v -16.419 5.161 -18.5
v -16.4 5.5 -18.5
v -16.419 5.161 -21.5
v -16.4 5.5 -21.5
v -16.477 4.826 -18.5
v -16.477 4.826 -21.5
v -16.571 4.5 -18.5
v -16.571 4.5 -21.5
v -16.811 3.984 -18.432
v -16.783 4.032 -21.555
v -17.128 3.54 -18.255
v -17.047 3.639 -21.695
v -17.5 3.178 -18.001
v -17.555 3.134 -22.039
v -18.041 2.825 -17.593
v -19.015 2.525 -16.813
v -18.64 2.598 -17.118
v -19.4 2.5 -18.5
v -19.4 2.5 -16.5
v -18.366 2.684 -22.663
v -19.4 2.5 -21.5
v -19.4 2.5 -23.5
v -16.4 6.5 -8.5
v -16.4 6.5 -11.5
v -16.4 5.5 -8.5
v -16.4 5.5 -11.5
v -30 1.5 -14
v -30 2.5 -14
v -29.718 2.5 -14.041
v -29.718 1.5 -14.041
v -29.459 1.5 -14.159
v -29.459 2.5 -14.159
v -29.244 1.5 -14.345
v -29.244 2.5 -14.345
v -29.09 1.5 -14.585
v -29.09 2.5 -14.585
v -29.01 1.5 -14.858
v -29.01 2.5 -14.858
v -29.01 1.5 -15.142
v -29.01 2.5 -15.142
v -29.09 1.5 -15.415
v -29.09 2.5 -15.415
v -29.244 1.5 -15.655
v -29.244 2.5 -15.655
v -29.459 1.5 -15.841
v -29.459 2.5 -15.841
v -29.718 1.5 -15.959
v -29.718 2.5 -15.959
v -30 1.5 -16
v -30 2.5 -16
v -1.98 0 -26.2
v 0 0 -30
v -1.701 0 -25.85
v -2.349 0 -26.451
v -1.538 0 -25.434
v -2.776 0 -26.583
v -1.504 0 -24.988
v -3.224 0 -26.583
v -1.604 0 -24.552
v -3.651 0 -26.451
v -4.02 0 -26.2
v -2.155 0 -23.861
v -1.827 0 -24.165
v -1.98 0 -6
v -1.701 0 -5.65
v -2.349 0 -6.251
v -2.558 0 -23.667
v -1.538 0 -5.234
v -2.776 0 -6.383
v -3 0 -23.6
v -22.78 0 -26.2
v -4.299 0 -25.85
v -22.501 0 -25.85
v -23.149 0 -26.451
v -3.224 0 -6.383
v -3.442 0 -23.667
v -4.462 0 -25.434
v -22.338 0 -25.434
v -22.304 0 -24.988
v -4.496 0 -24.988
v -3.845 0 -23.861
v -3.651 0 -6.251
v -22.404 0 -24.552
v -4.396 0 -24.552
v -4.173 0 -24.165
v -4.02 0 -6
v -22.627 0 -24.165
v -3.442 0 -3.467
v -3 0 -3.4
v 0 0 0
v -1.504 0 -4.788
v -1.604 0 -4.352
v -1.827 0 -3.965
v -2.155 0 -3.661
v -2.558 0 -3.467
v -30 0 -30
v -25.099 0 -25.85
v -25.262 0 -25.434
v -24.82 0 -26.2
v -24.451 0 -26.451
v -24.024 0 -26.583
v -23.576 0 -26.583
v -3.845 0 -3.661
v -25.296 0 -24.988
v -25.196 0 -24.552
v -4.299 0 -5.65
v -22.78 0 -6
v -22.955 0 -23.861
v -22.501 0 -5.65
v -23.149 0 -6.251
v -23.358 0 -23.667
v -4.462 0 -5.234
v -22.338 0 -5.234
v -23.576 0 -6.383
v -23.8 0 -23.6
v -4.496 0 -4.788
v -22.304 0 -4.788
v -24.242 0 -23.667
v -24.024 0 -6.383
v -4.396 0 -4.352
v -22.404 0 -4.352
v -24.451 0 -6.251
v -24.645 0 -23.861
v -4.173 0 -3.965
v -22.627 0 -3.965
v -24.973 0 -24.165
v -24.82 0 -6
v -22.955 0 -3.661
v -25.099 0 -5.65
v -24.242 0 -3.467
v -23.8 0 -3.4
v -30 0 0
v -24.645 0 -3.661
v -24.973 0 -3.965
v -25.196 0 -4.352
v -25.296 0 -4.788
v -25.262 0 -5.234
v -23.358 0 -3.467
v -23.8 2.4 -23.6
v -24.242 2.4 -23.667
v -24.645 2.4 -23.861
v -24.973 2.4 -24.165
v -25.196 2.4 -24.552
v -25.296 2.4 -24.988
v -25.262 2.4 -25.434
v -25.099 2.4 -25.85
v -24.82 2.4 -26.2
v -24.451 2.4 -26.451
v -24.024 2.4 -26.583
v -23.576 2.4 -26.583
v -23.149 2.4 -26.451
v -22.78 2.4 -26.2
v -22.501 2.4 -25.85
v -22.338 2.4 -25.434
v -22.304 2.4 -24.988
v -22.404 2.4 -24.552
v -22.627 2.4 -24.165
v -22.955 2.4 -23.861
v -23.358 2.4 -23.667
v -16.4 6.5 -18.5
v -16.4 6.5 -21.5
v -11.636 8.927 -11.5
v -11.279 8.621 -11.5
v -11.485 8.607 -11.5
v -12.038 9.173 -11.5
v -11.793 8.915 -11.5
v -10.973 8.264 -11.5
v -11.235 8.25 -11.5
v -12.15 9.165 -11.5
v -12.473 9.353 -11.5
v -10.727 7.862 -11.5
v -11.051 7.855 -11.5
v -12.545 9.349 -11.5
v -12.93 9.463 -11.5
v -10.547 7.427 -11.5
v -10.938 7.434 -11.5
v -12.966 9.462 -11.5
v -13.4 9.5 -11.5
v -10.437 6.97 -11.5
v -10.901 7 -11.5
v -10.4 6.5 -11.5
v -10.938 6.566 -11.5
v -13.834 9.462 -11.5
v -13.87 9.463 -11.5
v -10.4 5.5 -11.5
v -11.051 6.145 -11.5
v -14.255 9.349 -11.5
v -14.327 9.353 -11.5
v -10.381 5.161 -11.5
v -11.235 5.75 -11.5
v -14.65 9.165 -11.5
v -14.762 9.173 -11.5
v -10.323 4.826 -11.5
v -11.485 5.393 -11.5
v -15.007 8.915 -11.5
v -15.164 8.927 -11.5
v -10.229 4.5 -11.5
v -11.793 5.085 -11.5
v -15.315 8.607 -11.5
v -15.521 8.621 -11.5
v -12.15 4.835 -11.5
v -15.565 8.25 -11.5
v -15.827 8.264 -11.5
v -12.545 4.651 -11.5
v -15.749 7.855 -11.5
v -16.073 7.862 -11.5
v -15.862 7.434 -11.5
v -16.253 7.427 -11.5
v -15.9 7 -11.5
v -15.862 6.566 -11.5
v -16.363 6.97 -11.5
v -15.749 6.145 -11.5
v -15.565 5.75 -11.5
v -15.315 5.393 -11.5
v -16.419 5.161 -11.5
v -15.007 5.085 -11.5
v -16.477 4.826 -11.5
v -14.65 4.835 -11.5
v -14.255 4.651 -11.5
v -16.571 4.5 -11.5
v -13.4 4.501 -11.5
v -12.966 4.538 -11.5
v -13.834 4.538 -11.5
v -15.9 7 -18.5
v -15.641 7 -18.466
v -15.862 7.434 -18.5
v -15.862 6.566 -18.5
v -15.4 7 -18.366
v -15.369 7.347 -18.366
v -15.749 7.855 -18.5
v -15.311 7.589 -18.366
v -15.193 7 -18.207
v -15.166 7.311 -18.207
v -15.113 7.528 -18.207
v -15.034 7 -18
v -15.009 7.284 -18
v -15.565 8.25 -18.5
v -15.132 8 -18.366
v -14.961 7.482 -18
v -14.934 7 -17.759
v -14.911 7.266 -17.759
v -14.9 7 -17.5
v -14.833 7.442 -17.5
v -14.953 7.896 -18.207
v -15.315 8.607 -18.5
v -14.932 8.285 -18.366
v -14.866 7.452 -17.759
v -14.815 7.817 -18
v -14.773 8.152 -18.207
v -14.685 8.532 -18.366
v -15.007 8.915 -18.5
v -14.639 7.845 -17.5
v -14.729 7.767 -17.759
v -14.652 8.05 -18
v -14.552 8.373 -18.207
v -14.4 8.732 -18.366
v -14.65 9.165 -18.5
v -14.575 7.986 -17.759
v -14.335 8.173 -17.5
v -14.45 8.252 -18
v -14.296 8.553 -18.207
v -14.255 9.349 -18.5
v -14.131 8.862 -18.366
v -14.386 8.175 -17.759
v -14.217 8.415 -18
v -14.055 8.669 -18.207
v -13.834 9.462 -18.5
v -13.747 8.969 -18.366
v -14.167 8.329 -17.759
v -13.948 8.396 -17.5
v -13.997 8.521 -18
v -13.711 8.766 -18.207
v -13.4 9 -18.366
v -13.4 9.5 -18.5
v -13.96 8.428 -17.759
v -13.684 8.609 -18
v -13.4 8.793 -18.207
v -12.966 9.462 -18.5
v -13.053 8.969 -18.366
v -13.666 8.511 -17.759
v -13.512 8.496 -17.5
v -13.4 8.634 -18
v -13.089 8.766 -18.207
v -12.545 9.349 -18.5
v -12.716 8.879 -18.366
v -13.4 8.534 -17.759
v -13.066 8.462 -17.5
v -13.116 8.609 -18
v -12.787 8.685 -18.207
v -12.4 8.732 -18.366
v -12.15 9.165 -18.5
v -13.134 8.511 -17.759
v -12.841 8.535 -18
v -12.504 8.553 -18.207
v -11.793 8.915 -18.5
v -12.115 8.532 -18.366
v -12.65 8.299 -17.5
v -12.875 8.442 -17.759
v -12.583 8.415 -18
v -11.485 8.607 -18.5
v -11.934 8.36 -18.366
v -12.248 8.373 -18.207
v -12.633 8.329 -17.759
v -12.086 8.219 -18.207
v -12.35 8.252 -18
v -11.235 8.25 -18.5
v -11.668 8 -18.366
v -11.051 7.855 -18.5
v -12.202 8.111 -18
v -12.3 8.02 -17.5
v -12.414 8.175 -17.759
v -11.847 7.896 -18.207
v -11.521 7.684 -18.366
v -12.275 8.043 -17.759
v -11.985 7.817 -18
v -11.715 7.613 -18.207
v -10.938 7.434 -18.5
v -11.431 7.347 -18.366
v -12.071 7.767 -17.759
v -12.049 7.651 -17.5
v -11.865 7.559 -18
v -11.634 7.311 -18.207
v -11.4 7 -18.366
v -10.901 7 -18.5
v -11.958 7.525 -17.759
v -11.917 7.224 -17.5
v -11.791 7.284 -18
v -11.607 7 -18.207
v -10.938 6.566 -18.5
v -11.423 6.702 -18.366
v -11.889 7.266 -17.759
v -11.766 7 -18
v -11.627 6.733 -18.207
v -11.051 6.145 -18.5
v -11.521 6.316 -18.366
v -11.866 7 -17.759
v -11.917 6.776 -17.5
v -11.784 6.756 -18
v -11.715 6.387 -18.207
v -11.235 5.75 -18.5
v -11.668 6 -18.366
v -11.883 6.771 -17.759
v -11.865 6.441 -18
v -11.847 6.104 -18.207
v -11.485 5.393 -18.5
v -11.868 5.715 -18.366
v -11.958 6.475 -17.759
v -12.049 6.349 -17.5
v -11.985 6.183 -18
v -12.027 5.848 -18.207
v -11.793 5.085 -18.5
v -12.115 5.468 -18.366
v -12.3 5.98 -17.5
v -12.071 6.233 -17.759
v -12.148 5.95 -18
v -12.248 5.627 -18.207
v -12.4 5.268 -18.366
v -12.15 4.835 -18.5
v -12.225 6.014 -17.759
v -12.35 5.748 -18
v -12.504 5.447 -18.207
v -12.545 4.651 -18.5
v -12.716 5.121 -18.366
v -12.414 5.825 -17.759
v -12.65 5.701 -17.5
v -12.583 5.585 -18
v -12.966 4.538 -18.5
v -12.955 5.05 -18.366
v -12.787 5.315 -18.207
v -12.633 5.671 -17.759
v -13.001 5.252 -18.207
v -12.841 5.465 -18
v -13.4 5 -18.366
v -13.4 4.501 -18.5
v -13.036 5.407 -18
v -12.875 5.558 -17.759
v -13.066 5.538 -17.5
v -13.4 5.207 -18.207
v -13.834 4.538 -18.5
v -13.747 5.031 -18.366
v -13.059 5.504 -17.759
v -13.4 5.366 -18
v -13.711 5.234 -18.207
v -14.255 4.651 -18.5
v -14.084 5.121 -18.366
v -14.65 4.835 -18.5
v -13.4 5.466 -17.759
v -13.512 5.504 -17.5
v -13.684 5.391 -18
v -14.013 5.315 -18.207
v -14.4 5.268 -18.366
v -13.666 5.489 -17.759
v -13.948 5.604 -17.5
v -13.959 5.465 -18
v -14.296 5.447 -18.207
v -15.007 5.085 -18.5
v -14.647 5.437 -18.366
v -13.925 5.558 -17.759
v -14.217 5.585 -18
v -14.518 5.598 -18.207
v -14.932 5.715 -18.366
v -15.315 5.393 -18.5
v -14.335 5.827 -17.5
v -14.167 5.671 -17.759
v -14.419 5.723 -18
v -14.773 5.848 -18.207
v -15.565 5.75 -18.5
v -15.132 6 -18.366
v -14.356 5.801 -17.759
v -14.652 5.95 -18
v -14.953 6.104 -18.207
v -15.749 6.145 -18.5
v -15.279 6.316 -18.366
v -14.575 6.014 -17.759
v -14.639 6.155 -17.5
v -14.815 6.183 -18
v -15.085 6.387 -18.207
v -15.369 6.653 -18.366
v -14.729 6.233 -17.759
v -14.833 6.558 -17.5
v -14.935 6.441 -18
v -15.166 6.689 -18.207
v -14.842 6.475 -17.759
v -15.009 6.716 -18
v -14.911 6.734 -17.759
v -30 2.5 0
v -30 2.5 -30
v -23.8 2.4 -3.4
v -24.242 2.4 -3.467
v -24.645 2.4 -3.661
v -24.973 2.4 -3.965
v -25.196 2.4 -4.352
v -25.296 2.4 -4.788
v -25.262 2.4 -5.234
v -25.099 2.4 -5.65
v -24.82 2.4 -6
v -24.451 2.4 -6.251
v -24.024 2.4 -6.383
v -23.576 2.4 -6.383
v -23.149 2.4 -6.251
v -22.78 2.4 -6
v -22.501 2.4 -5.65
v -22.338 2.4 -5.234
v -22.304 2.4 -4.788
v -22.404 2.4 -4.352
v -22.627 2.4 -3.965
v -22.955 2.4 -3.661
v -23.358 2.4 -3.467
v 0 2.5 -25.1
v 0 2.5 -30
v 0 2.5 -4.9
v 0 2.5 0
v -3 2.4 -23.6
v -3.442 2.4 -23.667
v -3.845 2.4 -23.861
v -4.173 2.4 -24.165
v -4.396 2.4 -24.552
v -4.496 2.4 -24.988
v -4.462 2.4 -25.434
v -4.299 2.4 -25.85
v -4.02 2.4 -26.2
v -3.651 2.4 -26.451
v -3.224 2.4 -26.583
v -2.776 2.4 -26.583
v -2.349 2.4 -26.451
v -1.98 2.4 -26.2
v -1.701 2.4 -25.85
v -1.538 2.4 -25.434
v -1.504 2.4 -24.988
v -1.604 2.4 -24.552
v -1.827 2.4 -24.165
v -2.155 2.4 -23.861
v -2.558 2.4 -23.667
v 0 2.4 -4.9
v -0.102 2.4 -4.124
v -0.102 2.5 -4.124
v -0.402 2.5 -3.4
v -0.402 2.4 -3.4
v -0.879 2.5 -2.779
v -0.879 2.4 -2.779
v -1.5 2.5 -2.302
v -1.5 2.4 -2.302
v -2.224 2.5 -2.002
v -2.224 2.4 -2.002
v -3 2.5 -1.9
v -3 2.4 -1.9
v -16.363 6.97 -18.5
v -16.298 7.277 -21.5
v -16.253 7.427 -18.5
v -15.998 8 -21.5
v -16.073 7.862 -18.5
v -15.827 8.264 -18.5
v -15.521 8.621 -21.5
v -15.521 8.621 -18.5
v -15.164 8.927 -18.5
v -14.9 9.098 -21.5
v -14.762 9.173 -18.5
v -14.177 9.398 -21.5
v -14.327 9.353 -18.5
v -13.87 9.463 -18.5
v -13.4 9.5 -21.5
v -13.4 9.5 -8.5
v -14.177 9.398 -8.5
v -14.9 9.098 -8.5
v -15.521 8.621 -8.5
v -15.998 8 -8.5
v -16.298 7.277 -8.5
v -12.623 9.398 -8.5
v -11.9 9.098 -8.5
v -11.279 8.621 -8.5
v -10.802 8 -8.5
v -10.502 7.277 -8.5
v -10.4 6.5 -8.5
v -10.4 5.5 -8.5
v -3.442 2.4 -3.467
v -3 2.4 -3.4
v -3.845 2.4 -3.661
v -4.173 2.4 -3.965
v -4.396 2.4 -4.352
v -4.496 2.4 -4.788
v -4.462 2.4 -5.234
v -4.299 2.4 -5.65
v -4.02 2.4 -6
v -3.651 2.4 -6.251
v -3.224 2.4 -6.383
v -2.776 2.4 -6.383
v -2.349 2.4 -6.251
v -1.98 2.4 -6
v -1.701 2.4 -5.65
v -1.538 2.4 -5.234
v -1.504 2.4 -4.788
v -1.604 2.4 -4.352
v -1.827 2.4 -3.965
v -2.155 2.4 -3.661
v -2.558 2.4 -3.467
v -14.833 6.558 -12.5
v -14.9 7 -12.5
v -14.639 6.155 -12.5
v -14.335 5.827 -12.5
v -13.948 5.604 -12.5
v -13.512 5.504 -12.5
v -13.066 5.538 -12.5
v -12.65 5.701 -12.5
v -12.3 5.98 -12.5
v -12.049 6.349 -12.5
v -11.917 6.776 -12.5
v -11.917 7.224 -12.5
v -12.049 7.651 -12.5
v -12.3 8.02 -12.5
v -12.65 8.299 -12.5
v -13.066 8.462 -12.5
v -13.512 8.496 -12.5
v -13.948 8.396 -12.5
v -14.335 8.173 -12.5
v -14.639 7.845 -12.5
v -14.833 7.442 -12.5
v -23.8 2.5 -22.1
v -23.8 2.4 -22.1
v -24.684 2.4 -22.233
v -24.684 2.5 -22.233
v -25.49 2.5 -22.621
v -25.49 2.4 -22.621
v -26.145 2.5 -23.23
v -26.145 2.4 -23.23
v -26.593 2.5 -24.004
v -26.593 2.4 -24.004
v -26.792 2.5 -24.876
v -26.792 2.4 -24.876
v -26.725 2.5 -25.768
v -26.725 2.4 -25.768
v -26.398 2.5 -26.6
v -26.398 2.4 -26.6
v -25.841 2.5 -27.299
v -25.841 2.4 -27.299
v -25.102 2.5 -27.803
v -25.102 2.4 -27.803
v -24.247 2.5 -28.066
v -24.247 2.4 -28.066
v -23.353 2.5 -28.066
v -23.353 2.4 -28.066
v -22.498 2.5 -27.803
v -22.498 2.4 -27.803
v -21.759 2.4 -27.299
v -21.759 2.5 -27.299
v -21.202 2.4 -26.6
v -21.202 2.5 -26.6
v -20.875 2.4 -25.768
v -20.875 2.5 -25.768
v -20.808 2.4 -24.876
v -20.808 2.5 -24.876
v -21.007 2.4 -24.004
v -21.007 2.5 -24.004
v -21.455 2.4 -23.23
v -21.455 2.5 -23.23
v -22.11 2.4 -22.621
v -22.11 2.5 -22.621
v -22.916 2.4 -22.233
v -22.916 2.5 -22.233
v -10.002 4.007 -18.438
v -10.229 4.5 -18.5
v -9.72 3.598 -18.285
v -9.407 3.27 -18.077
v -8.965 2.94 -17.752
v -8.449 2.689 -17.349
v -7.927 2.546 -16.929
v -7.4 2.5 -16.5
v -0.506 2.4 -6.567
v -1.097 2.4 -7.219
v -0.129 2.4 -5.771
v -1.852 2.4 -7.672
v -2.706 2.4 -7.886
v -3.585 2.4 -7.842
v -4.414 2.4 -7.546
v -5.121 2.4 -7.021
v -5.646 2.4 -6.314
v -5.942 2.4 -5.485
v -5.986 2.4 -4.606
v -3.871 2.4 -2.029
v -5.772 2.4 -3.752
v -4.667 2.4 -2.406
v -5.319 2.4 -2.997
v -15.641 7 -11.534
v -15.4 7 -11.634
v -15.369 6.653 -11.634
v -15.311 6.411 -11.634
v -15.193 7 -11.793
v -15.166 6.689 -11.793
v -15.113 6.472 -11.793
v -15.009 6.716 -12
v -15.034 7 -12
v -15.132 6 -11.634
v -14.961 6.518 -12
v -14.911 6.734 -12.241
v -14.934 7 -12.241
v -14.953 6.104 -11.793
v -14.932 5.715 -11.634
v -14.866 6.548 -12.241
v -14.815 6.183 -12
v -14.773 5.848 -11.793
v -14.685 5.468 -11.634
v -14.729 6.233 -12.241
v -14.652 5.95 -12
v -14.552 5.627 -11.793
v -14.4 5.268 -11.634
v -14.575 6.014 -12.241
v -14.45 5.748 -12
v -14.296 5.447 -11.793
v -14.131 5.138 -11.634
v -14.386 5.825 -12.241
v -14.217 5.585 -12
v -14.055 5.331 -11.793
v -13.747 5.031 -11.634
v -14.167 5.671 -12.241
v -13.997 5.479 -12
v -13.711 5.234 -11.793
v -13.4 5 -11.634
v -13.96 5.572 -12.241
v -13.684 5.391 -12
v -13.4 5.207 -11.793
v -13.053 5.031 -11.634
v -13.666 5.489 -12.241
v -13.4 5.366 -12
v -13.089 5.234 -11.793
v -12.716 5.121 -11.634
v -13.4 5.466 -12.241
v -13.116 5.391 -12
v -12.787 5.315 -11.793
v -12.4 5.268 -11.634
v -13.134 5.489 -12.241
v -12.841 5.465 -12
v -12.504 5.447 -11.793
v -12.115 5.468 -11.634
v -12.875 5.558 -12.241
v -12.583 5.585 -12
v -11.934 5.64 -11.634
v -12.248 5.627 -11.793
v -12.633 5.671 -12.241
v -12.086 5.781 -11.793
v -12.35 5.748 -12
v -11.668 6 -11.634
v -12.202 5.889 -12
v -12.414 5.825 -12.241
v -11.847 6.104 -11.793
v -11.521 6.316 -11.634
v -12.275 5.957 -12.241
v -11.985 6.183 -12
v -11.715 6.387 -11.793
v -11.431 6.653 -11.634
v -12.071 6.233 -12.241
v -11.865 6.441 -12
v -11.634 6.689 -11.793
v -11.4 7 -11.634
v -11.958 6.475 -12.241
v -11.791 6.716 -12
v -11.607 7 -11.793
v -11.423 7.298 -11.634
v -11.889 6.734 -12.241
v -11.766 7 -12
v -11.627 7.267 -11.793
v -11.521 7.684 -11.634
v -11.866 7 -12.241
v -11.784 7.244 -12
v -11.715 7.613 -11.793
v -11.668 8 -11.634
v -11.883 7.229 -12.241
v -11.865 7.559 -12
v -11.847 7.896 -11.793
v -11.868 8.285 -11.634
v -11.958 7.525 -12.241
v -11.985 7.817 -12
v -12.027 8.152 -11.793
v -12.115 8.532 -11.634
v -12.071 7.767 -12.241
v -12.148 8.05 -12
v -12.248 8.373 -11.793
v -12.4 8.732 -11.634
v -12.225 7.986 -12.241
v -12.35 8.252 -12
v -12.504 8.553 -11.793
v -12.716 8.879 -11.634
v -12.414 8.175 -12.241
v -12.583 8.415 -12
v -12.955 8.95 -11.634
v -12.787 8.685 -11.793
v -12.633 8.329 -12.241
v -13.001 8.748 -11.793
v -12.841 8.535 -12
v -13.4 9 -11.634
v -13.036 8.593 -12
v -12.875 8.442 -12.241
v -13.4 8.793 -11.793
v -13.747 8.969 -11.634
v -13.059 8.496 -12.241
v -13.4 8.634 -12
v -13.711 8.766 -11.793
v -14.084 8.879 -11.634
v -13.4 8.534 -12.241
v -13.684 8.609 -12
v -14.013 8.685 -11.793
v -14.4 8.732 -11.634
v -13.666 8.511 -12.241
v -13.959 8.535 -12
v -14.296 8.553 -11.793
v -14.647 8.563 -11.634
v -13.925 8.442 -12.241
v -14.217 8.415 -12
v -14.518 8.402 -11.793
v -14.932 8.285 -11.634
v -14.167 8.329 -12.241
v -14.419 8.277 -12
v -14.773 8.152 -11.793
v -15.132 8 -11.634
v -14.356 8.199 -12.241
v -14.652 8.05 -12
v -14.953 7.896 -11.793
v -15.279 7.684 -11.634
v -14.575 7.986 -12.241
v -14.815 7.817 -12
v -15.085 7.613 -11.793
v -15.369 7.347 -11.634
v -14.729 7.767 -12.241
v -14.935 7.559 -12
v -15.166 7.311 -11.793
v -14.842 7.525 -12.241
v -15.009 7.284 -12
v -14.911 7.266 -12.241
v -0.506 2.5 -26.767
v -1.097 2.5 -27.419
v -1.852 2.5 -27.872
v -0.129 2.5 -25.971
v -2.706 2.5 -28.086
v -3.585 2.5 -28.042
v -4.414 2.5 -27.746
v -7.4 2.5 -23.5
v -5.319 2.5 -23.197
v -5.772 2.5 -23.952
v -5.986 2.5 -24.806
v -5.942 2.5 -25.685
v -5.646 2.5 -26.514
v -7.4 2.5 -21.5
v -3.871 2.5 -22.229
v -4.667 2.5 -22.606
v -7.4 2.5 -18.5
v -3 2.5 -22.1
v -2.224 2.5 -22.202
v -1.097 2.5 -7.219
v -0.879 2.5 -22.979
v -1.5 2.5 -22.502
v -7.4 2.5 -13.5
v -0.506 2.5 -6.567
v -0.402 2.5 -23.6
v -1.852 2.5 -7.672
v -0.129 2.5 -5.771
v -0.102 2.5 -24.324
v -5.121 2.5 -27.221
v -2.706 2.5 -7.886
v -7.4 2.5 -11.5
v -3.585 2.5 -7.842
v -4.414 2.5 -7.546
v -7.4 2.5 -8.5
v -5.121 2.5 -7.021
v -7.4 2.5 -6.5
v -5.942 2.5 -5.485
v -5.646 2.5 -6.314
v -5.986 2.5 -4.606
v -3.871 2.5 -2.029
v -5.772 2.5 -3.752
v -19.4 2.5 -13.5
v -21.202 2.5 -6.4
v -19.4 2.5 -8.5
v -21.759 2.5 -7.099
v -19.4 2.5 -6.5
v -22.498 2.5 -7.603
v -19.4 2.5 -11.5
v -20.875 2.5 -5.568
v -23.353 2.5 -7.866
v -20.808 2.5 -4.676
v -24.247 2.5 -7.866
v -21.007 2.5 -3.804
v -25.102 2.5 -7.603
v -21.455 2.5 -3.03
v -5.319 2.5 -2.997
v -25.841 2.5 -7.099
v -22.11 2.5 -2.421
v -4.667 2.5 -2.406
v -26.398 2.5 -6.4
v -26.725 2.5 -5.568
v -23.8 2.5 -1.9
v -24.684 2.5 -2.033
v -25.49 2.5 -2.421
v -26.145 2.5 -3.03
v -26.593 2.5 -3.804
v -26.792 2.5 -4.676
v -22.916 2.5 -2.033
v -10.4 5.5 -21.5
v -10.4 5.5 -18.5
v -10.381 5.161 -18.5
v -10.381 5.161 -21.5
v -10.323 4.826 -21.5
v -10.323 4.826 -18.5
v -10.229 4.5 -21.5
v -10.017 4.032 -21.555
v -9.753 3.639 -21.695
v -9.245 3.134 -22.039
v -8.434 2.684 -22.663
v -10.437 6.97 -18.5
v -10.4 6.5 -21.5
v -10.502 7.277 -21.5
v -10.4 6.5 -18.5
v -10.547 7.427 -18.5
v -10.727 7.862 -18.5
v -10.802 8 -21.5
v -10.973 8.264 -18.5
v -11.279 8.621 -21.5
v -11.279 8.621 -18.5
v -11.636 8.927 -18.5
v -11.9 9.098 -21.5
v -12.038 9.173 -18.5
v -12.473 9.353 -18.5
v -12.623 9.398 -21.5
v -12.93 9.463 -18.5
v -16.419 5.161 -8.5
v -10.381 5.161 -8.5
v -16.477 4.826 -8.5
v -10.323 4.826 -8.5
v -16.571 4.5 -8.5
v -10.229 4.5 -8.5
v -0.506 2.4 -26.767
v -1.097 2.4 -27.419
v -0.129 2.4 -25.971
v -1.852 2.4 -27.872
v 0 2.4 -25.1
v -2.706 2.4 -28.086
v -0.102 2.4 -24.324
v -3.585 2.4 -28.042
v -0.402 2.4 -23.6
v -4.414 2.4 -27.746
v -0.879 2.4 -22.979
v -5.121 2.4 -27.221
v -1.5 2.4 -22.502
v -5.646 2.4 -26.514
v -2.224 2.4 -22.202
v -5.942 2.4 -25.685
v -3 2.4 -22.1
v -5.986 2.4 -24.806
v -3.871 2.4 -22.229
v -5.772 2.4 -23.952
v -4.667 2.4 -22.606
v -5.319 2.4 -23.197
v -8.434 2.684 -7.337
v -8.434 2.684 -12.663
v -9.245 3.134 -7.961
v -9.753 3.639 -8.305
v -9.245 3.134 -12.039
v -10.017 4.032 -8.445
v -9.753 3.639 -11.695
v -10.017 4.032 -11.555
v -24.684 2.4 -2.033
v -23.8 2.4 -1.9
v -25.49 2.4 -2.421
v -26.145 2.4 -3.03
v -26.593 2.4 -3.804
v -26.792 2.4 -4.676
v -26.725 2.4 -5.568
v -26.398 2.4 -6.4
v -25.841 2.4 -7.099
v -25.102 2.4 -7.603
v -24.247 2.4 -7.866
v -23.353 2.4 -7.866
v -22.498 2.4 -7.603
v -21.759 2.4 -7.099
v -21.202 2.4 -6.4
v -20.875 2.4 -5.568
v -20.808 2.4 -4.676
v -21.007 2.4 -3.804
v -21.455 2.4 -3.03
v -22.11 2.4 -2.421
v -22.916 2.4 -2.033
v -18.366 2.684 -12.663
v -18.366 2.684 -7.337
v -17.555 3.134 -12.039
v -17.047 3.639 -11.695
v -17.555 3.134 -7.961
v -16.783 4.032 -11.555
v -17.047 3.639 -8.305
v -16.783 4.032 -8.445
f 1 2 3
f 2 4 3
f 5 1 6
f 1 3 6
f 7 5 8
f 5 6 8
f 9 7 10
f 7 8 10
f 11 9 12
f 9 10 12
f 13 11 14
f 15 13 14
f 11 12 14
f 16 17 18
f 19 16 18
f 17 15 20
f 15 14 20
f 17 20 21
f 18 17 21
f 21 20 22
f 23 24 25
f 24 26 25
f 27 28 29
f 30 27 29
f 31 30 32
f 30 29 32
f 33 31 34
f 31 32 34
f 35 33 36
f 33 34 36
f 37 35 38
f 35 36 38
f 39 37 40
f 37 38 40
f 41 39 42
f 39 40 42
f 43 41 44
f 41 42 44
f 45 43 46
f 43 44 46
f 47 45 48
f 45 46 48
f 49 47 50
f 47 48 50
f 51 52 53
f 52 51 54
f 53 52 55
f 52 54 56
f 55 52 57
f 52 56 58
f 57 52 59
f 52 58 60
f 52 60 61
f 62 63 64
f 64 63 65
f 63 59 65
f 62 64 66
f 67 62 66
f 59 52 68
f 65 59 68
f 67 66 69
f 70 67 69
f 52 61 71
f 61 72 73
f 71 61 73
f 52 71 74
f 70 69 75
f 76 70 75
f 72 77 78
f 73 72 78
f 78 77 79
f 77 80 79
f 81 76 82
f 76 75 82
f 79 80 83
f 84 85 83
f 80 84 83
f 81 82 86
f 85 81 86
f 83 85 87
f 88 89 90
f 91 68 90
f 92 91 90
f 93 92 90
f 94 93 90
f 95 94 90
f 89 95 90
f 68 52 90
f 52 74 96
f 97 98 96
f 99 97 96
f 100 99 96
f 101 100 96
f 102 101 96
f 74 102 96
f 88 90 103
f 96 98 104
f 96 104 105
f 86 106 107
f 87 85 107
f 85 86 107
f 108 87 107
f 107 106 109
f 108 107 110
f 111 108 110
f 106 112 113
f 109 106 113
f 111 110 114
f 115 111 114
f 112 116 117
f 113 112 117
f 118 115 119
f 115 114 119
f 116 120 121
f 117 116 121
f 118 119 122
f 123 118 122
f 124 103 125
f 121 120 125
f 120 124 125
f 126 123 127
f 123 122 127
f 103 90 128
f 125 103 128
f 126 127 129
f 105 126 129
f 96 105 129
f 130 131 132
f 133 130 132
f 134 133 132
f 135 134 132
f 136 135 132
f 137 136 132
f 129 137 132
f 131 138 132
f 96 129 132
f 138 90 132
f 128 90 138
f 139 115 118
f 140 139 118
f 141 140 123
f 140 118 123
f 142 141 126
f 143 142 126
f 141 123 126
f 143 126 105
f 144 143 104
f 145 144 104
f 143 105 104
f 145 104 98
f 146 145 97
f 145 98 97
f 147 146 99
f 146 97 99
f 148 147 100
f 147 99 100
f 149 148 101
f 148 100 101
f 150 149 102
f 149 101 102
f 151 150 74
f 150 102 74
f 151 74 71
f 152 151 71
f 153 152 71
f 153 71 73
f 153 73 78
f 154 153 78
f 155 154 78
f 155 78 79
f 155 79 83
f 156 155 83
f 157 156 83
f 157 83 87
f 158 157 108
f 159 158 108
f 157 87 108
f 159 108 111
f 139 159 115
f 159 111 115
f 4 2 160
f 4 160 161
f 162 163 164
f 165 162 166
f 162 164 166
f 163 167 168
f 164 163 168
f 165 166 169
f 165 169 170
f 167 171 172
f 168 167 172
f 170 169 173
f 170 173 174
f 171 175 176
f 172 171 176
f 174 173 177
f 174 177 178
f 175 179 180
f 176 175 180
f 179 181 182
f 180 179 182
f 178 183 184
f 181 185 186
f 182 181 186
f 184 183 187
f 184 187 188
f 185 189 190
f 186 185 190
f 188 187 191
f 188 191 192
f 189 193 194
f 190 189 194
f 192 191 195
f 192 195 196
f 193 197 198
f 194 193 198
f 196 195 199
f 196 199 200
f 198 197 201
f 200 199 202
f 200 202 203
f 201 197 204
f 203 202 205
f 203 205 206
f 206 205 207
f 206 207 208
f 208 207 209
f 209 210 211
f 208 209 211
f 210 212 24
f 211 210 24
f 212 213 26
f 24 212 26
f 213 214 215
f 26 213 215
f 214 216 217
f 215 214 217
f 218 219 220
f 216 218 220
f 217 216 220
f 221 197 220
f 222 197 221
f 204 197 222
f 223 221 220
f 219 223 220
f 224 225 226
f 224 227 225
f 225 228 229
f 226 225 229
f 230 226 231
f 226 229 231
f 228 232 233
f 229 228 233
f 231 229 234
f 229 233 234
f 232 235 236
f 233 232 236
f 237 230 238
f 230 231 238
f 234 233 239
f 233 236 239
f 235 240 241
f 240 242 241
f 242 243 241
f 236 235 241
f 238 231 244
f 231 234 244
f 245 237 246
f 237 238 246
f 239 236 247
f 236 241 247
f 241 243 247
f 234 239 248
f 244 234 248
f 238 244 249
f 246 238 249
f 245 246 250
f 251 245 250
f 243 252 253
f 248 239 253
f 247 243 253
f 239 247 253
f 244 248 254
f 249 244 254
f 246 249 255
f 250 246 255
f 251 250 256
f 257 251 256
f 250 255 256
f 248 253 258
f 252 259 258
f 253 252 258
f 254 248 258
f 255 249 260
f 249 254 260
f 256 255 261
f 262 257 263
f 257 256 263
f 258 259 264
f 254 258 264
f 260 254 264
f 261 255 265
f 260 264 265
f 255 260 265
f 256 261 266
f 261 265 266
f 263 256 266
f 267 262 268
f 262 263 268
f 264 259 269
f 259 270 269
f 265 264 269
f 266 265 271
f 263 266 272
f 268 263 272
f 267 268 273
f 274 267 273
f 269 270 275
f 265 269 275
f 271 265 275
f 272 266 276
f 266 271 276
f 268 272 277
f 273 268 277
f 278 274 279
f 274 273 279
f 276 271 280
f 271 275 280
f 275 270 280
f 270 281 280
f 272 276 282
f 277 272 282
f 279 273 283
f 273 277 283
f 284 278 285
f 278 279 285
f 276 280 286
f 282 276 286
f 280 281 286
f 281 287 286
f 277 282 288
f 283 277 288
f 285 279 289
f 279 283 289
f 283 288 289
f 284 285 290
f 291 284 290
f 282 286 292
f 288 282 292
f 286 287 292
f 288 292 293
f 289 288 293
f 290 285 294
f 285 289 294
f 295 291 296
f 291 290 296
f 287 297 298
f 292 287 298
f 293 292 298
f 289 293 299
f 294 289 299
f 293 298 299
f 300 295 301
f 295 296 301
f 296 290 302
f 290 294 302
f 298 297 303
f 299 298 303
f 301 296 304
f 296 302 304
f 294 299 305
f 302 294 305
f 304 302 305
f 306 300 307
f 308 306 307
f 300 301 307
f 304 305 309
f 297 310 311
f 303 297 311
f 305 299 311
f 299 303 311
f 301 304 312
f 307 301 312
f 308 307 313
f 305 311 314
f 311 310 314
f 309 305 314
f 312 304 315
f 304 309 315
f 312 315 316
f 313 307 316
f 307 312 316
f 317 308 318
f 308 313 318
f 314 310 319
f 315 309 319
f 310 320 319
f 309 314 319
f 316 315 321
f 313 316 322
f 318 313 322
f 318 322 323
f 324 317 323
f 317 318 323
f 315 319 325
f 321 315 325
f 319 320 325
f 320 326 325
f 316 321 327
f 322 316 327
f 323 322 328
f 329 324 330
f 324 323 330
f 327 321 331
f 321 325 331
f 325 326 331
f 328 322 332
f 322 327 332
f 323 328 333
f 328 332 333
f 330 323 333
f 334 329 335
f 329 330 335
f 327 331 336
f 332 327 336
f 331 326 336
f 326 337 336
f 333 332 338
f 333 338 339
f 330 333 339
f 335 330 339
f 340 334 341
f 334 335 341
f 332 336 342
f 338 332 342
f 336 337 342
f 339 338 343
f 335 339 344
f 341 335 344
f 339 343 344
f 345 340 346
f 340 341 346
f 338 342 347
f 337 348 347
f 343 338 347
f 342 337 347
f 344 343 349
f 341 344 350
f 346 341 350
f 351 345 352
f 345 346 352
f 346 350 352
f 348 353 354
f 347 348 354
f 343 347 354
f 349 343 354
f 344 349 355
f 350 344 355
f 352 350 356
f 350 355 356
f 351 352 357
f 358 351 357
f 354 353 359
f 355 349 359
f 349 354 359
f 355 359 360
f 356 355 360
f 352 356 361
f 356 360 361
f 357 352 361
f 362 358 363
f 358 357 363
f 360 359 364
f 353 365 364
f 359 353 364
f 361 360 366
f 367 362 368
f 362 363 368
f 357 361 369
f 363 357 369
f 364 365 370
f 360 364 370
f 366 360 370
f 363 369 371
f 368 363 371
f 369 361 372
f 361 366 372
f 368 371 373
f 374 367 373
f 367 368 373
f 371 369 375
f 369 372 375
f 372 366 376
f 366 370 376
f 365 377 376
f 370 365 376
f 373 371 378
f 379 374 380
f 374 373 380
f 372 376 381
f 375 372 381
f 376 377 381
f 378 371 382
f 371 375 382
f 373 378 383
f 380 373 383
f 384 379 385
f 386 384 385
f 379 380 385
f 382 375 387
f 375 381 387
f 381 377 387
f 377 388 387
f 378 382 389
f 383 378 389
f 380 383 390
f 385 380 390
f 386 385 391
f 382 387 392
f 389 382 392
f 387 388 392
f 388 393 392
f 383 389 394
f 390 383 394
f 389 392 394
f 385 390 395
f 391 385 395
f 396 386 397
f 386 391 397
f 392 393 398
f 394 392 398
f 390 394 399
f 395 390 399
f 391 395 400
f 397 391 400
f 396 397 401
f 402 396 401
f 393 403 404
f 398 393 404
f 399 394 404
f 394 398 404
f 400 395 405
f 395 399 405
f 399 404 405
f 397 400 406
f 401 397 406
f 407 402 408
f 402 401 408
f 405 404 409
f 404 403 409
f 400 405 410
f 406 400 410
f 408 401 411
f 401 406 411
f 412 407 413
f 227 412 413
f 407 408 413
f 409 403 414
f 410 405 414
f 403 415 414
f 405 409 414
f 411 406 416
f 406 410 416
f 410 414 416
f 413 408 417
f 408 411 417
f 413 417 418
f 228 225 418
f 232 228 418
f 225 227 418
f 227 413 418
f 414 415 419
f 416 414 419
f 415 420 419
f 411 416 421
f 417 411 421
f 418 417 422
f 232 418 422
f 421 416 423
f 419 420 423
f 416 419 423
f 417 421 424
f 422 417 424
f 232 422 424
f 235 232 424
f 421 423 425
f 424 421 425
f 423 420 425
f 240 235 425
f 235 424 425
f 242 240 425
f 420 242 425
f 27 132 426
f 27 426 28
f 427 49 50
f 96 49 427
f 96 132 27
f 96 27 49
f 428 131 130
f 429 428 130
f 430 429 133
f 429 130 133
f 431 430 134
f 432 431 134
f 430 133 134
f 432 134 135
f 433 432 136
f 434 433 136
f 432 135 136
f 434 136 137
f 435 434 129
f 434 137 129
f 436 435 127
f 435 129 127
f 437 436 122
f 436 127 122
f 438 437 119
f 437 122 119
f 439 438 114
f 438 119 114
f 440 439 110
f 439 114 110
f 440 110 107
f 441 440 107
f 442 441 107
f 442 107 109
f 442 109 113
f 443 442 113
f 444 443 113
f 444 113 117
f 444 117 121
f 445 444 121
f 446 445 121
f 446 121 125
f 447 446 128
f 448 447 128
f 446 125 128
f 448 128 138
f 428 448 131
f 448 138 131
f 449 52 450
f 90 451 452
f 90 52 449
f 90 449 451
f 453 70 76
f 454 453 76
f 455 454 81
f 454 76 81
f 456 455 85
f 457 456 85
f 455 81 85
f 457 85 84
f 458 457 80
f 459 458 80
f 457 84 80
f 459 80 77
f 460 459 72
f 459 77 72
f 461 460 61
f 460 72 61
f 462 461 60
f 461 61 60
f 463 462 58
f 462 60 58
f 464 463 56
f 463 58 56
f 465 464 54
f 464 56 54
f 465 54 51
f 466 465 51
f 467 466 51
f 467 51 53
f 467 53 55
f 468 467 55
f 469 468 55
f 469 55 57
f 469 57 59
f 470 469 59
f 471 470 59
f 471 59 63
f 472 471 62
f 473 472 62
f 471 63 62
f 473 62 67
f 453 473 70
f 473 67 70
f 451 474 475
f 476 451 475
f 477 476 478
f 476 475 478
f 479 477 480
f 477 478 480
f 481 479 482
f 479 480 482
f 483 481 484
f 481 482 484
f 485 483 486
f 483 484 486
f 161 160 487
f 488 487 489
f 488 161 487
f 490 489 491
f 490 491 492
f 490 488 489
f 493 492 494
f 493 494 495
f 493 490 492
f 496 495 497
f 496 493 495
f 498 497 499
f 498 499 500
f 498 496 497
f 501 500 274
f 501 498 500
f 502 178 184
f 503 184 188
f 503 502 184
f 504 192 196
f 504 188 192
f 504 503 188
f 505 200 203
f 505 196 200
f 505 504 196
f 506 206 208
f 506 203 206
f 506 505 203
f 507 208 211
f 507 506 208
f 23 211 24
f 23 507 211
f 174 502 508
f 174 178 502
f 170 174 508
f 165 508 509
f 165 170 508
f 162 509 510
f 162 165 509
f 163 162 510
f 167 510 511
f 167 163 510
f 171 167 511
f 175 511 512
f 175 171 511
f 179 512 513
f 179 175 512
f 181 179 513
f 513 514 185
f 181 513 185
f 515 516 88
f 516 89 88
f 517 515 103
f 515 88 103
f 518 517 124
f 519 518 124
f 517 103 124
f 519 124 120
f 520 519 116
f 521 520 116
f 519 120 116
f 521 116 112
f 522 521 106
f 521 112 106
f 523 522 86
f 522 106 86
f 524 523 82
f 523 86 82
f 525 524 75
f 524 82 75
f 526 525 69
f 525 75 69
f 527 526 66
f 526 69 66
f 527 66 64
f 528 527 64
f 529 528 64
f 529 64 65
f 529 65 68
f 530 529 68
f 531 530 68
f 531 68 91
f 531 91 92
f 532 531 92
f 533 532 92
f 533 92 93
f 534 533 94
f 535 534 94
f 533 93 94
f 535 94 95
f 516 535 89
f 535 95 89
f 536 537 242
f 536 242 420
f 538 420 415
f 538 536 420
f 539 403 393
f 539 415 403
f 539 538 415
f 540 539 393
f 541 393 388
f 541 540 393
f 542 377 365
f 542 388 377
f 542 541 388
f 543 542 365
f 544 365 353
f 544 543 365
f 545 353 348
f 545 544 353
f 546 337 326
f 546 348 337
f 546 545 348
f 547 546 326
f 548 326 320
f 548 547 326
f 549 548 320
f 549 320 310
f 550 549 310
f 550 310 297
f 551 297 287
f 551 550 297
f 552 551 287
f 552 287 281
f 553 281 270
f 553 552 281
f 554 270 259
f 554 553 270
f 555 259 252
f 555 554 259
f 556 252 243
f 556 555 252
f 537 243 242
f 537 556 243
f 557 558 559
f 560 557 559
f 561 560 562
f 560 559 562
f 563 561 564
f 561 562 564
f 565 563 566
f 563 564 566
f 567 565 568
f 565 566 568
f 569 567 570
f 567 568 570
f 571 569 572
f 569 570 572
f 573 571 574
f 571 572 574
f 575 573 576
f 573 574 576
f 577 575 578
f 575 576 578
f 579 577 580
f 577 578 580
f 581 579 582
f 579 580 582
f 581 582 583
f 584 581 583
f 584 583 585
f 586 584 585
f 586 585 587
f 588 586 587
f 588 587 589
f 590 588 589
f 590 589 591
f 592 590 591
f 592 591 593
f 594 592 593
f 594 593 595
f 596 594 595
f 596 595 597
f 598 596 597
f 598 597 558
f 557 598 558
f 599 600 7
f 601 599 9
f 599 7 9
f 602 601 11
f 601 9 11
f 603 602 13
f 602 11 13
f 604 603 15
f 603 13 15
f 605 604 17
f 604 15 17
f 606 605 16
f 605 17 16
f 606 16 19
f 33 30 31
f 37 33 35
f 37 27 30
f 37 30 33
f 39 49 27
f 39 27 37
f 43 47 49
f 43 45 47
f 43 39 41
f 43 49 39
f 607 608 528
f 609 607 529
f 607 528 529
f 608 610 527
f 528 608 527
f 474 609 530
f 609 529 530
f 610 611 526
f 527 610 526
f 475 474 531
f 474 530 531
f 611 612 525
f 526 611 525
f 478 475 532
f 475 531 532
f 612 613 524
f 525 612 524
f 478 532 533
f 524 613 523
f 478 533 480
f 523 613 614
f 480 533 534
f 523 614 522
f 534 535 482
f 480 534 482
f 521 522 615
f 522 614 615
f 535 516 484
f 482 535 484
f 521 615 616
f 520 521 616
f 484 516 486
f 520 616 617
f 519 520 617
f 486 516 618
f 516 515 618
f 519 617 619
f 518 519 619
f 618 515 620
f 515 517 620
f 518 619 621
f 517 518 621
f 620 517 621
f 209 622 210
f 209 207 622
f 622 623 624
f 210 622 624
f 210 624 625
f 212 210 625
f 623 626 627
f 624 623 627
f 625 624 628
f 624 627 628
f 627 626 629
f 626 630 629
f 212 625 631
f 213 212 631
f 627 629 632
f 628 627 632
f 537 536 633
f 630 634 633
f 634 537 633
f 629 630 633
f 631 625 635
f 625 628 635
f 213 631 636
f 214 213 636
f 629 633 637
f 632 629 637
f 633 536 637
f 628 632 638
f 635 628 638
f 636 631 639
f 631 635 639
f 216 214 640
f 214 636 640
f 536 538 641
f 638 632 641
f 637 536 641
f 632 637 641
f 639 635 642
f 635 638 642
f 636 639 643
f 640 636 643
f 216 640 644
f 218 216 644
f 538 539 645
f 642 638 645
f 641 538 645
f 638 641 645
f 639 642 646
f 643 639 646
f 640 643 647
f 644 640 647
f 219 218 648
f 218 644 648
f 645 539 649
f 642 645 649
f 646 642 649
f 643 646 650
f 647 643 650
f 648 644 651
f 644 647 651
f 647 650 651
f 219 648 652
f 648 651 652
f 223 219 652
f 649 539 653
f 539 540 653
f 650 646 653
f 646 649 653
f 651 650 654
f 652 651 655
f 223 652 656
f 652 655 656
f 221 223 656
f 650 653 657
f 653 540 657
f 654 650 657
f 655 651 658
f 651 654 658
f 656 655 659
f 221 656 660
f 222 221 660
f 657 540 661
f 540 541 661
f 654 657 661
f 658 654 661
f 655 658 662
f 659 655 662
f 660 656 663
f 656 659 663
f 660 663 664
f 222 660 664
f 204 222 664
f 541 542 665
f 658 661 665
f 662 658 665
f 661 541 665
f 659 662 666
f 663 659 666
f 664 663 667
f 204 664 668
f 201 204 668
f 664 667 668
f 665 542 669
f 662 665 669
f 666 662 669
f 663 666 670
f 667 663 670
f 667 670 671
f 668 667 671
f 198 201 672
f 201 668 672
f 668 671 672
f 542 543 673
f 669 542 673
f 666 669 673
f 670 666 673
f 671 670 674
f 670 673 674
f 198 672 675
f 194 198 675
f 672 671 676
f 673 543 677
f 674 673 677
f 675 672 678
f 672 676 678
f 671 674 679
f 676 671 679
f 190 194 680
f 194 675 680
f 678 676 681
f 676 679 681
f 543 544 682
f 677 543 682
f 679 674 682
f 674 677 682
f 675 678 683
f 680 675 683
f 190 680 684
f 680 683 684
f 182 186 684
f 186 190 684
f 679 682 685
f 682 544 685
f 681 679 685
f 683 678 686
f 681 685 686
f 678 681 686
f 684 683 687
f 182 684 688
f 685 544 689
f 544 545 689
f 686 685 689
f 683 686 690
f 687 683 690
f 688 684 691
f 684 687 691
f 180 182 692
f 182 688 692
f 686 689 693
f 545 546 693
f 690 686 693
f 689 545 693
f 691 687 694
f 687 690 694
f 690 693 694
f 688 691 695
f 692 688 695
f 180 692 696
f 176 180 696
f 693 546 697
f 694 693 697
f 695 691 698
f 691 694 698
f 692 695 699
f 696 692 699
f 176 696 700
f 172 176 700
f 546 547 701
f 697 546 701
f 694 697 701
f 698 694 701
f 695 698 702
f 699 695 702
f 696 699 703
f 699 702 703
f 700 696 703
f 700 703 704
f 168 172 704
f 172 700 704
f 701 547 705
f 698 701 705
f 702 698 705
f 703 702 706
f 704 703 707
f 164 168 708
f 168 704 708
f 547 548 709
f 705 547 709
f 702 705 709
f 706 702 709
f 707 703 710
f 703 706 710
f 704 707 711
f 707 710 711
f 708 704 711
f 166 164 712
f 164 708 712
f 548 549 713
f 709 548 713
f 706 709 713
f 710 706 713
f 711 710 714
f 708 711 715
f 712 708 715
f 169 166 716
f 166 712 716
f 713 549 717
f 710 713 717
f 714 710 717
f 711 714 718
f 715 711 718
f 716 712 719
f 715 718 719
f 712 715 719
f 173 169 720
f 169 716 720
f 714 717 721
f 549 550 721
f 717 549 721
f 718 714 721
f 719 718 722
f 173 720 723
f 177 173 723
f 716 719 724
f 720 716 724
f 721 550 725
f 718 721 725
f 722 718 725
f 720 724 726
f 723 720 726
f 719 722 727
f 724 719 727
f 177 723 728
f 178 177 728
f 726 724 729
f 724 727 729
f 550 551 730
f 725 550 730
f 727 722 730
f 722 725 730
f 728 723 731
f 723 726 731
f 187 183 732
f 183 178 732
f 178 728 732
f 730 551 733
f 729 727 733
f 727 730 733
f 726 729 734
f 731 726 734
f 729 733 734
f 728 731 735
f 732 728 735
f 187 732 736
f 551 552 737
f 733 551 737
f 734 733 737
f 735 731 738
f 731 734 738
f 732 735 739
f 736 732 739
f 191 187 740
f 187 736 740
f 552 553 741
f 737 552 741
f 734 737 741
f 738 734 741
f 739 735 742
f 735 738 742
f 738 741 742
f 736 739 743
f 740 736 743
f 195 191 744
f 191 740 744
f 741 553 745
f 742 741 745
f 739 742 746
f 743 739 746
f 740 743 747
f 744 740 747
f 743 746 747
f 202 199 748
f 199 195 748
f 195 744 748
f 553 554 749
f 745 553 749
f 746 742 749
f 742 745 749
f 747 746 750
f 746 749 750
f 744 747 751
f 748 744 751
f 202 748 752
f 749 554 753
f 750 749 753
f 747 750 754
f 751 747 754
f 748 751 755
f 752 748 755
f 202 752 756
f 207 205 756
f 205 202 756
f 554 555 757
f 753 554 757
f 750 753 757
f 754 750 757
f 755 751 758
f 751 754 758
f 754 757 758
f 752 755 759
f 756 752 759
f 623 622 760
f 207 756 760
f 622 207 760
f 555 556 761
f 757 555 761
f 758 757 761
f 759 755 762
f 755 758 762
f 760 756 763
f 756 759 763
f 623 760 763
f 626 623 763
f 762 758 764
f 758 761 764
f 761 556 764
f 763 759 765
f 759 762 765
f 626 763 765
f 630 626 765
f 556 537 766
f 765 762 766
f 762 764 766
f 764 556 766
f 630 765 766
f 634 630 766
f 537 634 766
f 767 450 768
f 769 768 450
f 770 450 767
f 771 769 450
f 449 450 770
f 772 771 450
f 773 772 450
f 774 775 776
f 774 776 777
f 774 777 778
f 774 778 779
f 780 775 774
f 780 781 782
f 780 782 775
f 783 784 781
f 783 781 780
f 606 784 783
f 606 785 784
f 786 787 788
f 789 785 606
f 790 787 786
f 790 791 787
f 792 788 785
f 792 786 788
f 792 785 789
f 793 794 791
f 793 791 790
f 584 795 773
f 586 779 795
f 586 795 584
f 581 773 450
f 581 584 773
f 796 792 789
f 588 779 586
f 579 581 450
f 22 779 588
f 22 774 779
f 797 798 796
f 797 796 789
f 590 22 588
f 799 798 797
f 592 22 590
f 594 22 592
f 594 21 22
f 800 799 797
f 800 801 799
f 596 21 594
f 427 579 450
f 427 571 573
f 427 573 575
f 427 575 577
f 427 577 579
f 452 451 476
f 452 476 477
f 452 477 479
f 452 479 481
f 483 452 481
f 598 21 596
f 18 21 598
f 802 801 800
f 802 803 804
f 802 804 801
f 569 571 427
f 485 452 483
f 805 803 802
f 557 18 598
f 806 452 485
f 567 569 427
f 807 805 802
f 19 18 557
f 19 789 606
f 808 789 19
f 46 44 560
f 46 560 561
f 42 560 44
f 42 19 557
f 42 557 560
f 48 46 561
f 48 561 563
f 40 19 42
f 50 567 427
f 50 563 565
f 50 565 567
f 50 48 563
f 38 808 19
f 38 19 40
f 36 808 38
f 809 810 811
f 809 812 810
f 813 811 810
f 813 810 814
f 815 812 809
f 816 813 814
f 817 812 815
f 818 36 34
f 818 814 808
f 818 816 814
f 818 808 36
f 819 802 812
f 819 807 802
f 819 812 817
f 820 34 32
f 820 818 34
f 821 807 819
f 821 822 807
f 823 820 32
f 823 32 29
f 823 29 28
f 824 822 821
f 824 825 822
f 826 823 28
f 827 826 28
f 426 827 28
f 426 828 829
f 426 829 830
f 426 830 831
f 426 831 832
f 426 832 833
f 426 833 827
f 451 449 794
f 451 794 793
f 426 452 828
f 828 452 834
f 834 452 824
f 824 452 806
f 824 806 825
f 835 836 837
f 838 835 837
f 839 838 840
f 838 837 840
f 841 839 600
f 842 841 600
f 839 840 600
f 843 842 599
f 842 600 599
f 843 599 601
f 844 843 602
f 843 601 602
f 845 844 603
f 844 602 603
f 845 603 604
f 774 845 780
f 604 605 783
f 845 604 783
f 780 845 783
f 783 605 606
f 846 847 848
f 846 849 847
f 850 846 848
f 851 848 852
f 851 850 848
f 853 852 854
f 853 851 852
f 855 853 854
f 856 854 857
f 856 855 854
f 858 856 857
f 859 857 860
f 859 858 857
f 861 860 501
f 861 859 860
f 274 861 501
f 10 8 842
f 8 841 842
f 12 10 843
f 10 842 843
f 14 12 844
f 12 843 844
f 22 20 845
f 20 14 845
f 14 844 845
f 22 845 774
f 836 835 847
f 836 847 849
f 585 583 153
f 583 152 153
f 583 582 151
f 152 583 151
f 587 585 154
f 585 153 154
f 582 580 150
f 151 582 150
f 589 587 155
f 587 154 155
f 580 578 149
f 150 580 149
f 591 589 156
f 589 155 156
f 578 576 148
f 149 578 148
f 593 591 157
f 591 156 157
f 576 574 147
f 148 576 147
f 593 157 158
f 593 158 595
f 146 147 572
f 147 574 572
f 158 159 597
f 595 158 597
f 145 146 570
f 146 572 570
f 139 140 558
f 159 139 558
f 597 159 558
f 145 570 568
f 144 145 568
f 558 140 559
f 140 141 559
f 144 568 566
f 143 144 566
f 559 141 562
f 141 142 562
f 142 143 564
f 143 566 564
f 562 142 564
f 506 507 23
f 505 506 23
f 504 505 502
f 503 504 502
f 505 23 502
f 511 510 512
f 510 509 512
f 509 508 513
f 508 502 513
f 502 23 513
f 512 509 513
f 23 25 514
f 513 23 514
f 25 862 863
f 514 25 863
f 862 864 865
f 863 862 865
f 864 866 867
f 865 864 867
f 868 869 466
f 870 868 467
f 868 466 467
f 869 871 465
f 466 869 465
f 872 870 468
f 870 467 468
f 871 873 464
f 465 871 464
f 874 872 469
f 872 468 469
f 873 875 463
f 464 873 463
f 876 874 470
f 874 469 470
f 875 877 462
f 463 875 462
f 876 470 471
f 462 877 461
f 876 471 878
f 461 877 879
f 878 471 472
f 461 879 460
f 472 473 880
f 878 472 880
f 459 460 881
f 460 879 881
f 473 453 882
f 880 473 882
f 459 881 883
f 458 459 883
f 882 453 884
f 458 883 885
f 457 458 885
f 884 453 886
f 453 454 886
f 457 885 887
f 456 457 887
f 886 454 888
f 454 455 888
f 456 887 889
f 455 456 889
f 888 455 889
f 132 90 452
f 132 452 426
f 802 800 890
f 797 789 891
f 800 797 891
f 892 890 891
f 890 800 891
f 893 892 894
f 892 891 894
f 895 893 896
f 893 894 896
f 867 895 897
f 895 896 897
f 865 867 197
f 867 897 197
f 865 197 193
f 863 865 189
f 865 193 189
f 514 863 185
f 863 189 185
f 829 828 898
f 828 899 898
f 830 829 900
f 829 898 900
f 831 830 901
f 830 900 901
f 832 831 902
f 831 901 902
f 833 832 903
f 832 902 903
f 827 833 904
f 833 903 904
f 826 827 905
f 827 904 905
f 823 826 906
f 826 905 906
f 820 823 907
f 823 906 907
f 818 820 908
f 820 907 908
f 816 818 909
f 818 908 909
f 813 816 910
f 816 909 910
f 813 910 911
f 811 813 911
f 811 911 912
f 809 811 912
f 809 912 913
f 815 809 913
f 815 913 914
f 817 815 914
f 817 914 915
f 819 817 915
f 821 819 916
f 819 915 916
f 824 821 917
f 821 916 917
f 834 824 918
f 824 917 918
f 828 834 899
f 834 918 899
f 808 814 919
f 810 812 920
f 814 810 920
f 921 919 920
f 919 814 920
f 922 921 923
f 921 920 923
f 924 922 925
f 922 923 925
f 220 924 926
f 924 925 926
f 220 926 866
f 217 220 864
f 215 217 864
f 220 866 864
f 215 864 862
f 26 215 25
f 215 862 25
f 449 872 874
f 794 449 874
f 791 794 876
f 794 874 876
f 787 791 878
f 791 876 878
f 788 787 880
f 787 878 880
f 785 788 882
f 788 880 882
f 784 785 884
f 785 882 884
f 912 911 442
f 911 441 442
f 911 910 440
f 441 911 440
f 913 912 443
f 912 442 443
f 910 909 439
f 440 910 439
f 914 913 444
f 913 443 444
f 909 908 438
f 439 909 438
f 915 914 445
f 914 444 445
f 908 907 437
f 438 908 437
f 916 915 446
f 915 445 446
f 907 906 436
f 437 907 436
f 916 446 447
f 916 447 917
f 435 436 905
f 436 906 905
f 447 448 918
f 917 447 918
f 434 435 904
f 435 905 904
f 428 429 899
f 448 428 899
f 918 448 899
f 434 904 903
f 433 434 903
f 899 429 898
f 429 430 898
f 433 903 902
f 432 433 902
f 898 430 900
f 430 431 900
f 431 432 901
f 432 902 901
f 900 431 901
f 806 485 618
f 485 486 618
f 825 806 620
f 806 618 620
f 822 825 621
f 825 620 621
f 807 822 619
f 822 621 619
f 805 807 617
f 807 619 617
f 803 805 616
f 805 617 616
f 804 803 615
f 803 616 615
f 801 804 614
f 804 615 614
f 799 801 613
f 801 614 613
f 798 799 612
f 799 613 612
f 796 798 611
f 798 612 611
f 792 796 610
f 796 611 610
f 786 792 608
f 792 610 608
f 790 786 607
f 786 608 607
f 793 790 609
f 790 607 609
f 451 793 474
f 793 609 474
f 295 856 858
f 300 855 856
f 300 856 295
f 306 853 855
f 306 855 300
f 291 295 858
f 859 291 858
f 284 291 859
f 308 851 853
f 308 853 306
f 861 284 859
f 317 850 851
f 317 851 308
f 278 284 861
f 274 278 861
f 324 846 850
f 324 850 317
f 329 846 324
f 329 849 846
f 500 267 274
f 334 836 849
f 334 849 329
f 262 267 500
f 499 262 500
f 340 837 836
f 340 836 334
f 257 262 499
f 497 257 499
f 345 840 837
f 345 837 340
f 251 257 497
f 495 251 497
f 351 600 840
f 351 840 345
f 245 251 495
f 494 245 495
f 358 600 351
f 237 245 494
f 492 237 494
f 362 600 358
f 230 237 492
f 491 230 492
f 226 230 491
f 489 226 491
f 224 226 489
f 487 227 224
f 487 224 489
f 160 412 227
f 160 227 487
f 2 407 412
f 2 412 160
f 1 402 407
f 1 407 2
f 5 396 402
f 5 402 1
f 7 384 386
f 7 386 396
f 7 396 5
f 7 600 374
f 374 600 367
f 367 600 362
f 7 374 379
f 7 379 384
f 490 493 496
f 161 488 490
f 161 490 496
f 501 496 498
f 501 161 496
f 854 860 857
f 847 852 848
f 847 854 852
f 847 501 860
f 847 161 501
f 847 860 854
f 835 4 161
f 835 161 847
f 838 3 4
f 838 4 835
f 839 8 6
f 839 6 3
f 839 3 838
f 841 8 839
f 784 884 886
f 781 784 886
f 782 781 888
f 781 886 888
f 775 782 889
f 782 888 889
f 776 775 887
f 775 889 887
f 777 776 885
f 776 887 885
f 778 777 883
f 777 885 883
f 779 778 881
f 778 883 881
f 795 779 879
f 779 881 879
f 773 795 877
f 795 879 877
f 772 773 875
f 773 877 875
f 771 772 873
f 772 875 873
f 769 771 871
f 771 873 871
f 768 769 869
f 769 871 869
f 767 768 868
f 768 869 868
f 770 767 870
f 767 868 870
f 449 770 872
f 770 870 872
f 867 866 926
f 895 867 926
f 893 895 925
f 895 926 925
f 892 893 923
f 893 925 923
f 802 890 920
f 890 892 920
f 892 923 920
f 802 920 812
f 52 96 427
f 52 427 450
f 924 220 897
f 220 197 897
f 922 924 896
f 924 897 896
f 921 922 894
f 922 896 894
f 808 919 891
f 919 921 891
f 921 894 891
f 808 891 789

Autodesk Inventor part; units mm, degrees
ref_plane "YZ Plane" through (0, 0, 0) normal (1, 0, 0) x (0, 1, 0)
ref_plane "XZ Plane" through (0, 0, 0) normal (0, 1, 0) x (-1, 0, 0)
ref_plane "XY Plane" through (0, 0, 0) normal (0, 0, 1) x (1, 0, 0)
sketch "Sketch1" plane through (0, 0, 0) normal (0, 1, 0) x (-1, 0, 0)
  line L0 (0, 0) -> (30, 0)
  line L1 (30, 0) -> (30, -30)
  line L2 (30, -30) -> (0, -30)
  line L3 (0, -30) -> (0, 0)
  dimension "d0" = 30
  dimension "d1" = 30
extrude "Extrusion1" add sketch "Sketch1" along normal blind 2.5
sketch "Sketch2" plane through (0, 2.5, 0) normal (0, 1, 0) x (1, 0, 0)
  line L0 (-30, 0) -> (0, 0) projected
  line L1 (0, 0) -> (0, 30) projected
  line L2 (0, 30) -> (-30, 30) projected
  point P0 (-3, 4.9)
  point P1 (-3, 25.1)
  point P2 (-23.8, 25.1)
  point P3 (-23.8, 4.9)
  dimension "d14" = 20.2
  dimension "d15" = 20.8
  dimension "d16" = 4.9
  dimension "d17" = 20.2
  dimension "d18" = 3
  dimension "d19" = 20.8
  dimension "d20" = 4.9
  dimension "d21" = 4.9
hole "Hole1" at (-3, 2.5, -4.9) at (-3, 2.5, -25.1) at (-23.8, 2.5, -25.1) at (-23.8, 2.5, -4.9) direction (0, -1, 0) diameter 3 end through all counterbore diameter 6 counterbore depth 0.1
sketch "Sketch3" plane through (0, 2.5, 0) normal (0, 1, 0) x (1, 0, 0)
  line L0 (-30, 30) -> (-30, 0) projected
  circle A0 centre (-30, 15) radius 1
  point P0 (0, 0)
  point P1 (-30, 16)
  point P2 (-30, 14)
  dimension "d11" = 2
extrude "Extrusion2" cut sketch "Sketch3" against normal blind 1 contours A0 L0 picked at (-29.6652, 15.1995)
sketch "Sketch4" plane through (0, 2.5, 0) normal (0, 1, 0) x (1, 0, 0)
  line L0 (-10.4, 11.5) -> (-16.4, 11.5)
  line L1 (-16.4, 11.5) -> (-16.4, 8.5)
  line L2 (-16.4, 8.5) -> (-10.4, 8.5)
  line L3 (-10.4, 8.5) -> (-10.4, 11.5)
  line L4 (-30, 0) -> (0, 0) projected
  line L5 (0, 0) -> (0, 30) projected
  line L6 (-10.4, 18.5) -> (-16.4, 18.5)
  line L7 (-16.4, 18.5) -> (-16.4, 21.5)
  line L8 (-16.4, 21.5) -> (-10.4, 21.5)
  line L9 (-10.4, 21.5) -> (-10.4, 18.5)
  line L10 (-30, 30) -> (-30, 16) projected
  dimension "d22" = 6
  dimension "d23" = 3
  dimension "d24" = 8.5
  dimension "d25" = 10.4
  dimension "d26" = 3
  dimension "d27" = 7
  dimension "d28" = 13.6
  dimension "d29" = 10.4
extrude "Extrusion3" add sketch "Sketch4" along normal blind 7
fillet "Fillet1" radius 3 8 edges at (-10.4, 9.5, -10) (-16.4, 9.5, -10) (-16.4, 9.5, -20) (-10.4, 9.5, -20) (-10.4, 2.5, -20) (-10.4, 2.5, -10) (-16.4, 2.5, -20) (-16.4, 2.5, -10)
sketch "Sketch5" plane through (-7.4, 2.5, -11.5) normal (0, 0, -1) x (-1, 0, 0)
  circle A0 centre (6, 4.5) radius 1.5
  line L0 (12, 0) -> (0, 0) projected
  line L1 (3, 3) -> (3, 4) projected
  point P0 (-7.4, -2.5)
  dimension "d33" = 3
  dimension "d34" = 4.5
  dimension "d35" = 3
extrude "Extrusion4" add sketch "Sketch5" along normal up to surface (7 mm away)
fillet "Fillet2" radius 1 2 edges at (-11.9, 7, -11.5) (-11.9, 7, -18.5)
fillet "Fillet3" radius 2 4 edges at (-13.4, 2.5, -11.5) (-13.4, 2.5, -18.5) (-13.4, 2.5, -8.5) (-13.4, 2.5, -21.5)
sketch "Sketch6" plane through (0, 2.5, 0) normal (0, 1, 0) x (1, 0, 0)
  point P0 (0, 0)
properties part number "Upper mount"
